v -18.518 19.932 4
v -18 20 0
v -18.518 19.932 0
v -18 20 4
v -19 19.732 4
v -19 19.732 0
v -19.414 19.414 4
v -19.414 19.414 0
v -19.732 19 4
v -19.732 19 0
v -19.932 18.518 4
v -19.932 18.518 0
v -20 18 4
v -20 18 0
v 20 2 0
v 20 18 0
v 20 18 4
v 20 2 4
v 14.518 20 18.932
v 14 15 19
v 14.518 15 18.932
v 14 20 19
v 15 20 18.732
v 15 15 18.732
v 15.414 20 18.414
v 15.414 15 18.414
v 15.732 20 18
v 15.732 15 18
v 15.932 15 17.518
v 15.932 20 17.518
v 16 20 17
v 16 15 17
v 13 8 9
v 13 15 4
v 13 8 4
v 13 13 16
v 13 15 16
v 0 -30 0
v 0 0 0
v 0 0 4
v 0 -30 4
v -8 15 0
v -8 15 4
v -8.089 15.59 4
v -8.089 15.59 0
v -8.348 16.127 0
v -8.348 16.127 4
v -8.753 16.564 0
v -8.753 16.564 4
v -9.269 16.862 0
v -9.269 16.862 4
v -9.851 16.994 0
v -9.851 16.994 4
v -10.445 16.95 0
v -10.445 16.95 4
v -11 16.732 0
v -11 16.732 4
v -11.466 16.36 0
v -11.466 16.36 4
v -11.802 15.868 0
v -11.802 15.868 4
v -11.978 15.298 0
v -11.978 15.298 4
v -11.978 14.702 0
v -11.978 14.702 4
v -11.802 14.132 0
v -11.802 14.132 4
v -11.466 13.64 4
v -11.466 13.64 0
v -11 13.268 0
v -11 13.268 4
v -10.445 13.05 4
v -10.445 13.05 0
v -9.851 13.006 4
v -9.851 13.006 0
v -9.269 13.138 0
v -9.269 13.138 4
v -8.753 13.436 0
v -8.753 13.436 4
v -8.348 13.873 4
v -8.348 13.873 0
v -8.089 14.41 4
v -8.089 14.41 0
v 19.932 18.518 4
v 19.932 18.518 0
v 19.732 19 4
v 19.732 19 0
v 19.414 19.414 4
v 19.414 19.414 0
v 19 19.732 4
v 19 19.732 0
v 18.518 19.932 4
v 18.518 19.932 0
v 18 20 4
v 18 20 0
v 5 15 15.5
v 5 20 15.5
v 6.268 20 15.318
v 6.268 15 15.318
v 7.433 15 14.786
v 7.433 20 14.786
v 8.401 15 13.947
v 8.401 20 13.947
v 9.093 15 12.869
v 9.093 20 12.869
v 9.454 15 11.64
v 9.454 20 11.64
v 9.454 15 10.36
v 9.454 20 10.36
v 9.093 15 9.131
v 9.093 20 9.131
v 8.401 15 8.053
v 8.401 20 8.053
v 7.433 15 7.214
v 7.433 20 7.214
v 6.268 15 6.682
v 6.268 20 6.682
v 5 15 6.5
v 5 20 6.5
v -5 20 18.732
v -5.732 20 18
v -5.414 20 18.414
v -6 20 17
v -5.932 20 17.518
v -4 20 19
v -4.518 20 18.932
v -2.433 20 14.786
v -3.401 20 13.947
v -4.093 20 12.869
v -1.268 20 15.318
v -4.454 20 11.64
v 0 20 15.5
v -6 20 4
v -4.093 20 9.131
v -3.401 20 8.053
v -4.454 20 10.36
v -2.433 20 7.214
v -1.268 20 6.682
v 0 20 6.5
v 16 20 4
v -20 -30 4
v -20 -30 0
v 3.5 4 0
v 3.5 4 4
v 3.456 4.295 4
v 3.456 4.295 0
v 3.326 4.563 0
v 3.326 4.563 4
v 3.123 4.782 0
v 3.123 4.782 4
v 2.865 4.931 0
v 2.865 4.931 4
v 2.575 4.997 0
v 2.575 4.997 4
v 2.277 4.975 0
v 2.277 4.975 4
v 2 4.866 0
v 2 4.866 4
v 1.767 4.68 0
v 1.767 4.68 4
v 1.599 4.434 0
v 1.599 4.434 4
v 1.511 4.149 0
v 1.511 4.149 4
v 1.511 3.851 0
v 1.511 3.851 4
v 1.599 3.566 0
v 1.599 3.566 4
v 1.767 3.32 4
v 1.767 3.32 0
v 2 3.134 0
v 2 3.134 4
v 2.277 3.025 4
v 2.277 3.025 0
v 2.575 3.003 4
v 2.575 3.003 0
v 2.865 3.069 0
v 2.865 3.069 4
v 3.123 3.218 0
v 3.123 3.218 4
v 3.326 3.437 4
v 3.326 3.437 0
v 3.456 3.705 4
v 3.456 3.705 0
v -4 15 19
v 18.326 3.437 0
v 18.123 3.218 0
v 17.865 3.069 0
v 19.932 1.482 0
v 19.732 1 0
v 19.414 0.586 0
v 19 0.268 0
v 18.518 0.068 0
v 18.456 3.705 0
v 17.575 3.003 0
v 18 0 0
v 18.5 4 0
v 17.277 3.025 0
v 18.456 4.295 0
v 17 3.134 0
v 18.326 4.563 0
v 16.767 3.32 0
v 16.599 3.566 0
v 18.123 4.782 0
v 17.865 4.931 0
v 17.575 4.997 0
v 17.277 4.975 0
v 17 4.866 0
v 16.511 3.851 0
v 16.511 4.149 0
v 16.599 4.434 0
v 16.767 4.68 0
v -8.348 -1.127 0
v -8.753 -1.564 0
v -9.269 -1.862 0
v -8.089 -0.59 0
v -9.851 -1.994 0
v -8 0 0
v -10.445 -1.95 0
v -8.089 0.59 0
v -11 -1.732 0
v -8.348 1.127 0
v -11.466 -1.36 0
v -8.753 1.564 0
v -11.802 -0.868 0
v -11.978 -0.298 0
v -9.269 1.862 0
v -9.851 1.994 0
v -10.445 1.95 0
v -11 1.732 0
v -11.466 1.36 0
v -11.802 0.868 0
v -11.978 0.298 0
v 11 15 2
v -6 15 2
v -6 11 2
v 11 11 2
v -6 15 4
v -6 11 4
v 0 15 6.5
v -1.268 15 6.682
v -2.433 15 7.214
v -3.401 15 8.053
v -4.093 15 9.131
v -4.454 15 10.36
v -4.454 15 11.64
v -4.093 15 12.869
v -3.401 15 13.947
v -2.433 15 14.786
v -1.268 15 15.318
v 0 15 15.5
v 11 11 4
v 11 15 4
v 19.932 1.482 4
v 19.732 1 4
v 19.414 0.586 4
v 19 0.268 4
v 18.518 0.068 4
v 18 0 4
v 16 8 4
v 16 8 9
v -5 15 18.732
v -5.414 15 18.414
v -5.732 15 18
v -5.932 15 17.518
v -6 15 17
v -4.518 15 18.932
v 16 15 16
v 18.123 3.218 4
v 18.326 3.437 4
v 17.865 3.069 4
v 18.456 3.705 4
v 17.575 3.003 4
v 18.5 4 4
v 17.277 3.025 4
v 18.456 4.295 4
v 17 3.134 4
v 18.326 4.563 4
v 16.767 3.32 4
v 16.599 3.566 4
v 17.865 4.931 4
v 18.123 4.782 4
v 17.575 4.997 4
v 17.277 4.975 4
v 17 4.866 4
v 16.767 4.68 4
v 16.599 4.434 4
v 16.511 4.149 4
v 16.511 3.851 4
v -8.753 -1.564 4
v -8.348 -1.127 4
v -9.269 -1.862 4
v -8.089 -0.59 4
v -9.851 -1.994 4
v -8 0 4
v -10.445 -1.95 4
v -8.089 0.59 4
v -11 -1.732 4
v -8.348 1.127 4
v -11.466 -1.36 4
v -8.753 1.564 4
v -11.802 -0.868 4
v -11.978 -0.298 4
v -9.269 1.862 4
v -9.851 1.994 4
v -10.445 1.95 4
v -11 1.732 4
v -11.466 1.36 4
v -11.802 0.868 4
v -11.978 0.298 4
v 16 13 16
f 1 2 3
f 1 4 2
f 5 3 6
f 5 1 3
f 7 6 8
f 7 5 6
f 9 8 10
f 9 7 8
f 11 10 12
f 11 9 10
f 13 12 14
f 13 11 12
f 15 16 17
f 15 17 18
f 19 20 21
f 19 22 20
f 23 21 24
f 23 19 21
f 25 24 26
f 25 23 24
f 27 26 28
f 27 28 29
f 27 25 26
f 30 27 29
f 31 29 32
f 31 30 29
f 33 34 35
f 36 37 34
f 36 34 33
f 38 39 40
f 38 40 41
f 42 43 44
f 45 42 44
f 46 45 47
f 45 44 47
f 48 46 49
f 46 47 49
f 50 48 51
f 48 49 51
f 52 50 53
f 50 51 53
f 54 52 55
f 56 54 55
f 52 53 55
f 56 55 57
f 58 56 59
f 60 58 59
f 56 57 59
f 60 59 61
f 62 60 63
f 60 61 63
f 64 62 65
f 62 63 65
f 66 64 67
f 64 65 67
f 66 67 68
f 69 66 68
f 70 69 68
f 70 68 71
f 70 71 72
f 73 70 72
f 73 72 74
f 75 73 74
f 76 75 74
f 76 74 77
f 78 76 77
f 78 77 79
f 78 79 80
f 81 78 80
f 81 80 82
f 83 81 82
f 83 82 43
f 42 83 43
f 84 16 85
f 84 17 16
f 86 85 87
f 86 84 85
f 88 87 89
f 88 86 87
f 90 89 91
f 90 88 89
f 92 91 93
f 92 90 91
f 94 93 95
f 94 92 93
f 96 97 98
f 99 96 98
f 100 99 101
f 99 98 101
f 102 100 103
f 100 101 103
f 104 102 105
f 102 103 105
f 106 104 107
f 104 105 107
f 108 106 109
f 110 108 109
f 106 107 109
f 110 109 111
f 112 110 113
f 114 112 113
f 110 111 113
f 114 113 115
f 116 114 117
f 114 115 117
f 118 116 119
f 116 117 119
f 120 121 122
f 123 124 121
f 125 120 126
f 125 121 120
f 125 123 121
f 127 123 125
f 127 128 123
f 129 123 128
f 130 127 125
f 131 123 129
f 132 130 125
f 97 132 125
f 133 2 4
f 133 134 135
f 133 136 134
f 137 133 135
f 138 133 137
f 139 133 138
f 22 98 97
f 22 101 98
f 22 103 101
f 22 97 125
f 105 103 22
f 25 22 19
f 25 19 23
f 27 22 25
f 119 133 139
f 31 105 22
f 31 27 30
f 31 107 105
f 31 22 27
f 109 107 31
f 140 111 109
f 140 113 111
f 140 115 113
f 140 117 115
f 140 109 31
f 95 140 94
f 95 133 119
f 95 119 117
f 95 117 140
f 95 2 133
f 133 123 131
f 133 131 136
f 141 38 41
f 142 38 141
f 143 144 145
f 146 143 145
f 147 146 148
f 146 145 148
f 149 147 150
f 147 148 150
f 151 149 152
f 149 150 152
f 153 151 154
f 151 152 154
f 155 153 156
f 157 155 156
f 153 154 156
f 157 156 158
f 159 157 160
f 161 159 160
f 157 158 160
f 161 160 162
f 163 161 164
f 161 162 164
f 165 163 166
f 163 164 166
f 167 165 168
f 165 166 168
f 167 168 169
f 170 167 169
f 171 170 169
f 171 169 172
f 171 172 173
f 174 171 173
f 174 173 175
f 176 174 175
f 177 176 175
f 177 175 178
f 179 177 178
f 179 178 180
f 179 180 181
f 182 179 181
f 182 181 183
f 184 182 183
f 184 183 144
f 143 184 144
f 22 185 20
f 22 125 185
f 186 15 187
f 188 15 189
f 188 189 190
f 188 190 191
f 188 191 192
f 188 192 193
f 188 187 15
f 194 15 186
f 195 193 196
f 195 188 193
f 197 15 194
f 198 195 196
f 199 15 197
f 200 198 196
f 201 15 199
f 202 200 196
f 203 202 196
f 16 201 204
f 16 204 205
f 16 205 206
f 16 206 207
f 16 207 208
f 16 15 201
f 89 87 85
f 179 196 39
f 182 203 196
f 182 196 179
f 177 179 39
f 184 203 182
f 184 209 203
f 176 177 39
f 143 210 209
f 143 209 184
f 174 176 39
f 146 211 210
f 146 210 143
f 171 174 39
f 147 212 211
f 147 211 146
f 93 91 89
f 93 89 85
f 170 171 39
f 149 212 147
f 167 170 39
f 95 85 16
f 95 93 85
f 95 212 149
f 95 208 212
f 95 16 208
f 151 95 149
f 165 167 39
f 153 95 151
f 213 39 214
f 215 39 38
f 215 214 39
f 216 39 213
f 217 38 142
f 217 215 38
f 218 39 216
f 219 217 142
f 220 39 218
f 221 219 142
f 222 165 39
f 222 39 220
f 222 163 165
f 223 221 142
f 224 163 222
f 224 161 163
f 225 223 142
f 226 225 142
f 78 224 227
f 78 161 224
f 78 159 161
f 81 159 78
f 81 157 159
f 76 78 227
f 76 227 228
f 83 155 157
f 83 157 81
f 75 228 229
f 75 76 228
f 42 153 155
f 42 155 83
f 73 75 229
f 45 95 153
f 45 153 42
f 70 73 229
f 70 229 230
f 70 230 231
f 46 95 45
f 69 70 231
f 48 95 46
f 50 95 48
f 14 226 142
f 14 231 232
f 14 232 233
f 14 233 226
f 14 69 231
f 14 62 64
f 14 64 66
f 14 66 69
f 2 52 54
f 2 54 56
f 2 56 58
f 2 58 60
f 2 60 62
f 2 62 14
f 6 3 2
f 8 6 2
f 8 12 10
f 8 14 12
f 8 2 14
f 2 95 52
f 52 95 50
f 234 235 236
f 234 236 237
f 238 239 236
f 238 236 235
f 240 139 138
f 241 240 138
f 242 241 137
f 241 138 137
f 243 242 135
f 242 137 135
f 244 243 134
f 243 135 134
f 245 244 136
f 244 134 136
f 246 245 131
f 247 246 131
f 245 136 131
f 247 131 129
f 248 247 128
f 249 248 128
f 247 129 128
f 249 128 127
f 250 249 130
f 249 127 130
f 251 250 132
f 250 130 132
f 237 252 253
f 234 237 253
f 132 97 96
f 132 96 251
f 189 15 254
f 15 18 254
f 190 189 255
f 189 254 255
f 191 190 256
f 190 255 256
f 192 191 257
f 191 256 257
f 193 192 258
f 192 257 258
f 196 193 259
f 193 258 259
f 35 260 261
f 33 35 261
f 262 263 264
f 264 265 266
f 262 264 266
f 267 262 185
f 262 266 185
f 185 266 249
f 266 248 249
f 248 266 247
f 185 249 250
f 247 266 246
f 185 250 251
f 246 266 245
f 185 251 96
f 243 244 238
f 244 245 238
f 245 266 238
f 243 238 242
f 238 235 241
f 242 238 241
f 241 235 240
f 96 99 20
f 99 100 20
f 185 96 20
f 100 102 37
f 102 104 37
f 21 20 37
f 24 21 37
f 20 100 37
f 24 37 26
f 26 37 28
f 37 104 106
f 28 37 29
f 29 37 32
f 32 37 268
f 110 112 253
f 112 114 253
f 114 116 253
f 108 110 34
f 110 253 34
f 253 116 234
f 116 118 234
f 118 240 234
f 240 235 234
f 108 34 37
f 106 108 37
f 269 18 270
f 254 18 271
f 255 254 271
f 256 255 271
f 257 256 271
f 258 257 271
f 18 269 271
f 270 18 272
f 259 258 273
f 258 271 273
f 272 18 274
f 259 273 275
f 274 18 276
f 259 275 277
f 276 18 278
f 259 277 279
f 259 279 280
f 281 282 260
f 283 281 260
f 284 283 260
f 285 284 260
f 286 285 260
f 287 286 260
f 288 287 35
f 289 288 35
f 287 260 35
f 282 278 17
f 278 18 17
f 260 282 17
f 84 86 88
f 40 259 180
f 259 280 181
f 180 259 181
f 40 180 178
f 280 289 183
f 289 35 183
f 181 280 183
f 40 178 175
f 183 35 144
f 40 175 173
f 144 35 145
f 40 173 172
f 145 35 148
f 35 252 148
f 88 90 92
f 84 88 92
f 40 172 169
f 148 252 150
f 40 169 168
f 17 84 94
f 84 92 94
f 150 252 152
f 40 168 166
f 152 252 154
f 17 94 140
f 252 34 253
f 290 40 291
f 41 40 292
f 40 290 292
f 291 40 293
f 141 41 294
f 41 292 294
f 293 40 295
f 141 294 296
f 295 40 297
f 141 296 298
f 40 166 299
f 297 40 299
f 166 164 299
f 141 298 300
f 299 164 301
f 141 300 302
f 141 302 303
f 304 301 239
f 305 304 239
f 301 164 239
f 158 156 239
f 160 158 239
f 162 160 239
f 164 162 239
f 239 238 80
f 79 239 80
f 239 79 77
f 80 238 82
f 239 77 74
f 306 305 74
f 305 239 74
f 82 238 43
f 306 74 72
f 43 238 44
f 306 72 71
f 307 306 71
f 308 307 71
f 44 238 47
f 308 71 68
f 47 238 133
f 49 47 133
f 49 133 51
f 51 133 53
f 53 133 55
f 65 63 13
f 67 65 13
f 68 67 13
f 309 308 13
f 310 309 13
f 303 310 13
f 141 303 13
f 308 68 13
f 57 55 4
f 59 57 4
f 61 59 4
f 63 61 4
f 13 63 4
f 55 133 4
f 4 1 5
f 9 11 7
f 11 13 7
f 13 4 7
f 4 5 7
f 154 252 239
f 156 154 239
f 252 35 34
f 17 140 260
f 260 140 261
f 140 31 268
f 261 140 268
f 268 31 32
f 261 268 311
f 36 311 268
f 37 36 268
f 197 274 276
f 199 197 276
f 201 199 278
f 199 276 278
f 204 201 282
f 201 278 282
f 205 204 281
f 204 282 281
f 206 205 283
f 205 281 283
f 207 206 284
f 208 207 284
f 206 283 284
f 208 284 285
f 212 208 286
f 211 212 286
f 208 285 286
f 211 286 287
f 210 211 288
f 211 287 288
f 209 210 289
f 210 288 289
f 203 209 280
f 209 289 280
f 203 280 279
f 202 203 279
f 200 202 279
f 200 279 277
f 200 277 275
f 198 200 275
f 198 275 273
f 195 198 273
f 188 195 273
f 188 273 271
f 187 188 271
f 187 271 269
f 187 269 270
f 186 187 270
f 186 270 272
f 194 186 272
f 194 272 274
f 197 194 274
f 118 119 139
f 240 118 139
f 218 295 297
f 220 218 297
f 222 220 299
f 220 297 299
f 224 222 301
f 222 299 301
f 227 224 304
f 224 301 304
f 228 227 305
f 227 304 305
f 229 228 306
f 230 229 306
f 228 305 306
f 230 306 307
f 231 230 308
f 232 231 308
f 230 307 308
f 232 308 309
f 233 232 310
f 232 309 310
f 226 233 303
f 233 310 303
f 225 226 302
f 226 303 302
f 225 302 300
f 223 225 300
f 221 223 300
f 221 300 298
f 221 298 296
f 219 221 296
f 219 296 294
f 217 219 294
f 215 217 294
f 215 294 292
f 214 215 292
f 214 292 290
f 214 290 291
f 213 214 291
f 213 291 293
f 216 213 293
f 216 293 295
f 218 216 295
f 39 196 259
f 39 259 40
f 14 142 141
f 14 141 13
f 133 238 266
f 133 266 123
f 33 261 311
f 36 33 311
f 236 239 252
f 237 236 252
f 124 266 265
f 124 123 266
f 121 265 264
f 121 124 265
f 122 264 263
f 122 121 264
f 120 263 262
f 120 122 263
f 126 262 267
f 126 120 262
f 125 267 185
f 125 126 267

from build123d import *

# Parameters (mm, degrees)
PAD_DEPTH       = 4
SKETCH001_R     = 2
POCKET_DEPTH    = 4.001
SKETCH002_R     = 2
POCKET001_DEPTH = 4.001
SKETCH003_R     = 1
POCKET002_DEPTH = 4.001
SKETCH004_R     = 1
POCKET003_DEPTH = 4.001
SKETCH005_W     = 22
SKETCH005_H     = 5
PAD001_DEPTH    = 15
POCKET004_DEPTH = 50.001
FILLET_R        = 2
FILLET001_R     = 2
FILLET002_R     = 2
FILLET003_R     = 2
FILLET004_R     = 2
SKETCH007_W     = 17
SKETCH007_H     = 4
POCKET005_DEPTH = 2
PAD002_DEPTH    = 3


with BuildPart() as part:
    # Sketch → Pad (new body)
    with BuildSketch(Plane.XY):
        Polygon((-20, 20), (20, 20), (20, 0), (0, 0), (0, -30), (-20, -30), align=None)
    extrude(amount=PAD_DEPTH)

    # Sketch001 (on Face8 of Pad) → Pocket (cut, through all)
    with BuildSketch(Plane.XY.offset(4)):
        with Locations((-10, 15)):
            Circle(SKETCH001_R)
    extrude(amount=-POCKET_DEPTH, mode=Mode.SUBTRACT)

    # Sketch002 (on Face5 of Pocket) → Pocket001 (cut, through all)
    with BuildSketch(Plane.XY.offset(4)):
        with Locations((-10, 0)):
            Circle(SKETCH002_R)
    extrude(amount=-POCKET001_DEPTH, mode=Mode.SUBTRACT)

    # Sketch003 (on Face5 of Pocket001) → Pocket002 (cut, through all)
    with BuildSketch(Plane.XY.offset(4)):
        with Locations((2.5, 4)):
            Circle(SKETCH003_R)
    extrude(amount=-POCKET002_DEPTH, mode=Mode.SUBTRACT)

    # Sketch004 (on Face5 of Pocket002) → Pocket003 (cut, through all)
    with BuildSketch(Plane.XY.offset(4)):
        with Locations((17.5, 4)):
            Circle(SKETCH004_R)
    extrude(amount=-POCKET003_DEPTH, mode=Mode.SUBTRACT)

    # Sketch005 (on Face5 of Pocket003) → Pad001 (join)
    with BuildSketch(Plane.XY.offset(4)):
        with Locations((5, 17.5)):
            Rectangle(SKETCH005_W, SKETCH005_H)
    extrude(amount=PAD001_DEPTH)

    # Sketch006 (on Face6 of Pad001) → Pocket004 (cut, through all)
    with BuildSketch(Plane(origin=(0, 20, 0), x_dir=(-1, 0, 0), z_dir=(0, 1, 0))):
        with BuildLine():
            ThreePointArc((-5, 15.5), (-9.5, 11), (-5, 6.5))
            Line((-5, 6.5), (0, 6.5))
            ThreePointArc((0, 6.5), (4.5, 11), (0, 15.5))
            Line((-5, 15.5), (0, 15.5))
        make_face()
    extrude(amount=-POCKET004_DEPTH, mode=Mode.SUBTRACT)

    # Fillet
    fillet_edges = [part.edges().sort_by_distance(p)[0] for p in [
        (20, 0, 2),
    ]]
    fillet(fillet_edges, radius=FILLET_R)

    # Fillet001
    fillet001_edges = [part.edges().sort_by_distance(p)[0] for p in [
        (20, 20, 2),
    ]]
    fillet(fillet001_edges, radius=FILLET001_R)

    # Fillet002
    fillet002_edges = [part.edges().sort_by_distance(p)[0] for p in [
        (-20, 20, 2),
    ]]
    fillet(fillet002_edges, radius=FILLET002_R)

    # Fillet003
    fillet003_edges = [part.edges().sort_by_distance(p)[0] for p in [
        (-6, 17.5, 19),
    ]]
    fillet(fillet003_edges, radius=FILLET003_R)

    # Fillet004
    fillet004_edges = [part.edges().sort_by_distance(p)[0] for p in [
        (16, 17.5, 19),
    ]]
    fillet(fillet004_edges, radius=FILLET004_R)

    # Sketch007 (on Face13 of Fillet004) → Pocket005 (cut)
    with BuildSketch(Plane.XY.offset(4)):
        with Locations((2.5, 13)):
            Rectangle(SKETCH007_W, SKETCH007_H)
    extrude(amount=-POCKET005_DEPTH, mode=Mode.SUBTRACT)

    # Sketch008 (on Face5 of Pocket005) → Pad002 (join)
    with BuildSketch(Plane.YZ.offset(16)):
        Polygon((15, 4), (8, 4), (8, 9), (13, 16), (15, 16), align=None)
    extrude(amount=-PAD002_DEPTH)


solid = part.part
